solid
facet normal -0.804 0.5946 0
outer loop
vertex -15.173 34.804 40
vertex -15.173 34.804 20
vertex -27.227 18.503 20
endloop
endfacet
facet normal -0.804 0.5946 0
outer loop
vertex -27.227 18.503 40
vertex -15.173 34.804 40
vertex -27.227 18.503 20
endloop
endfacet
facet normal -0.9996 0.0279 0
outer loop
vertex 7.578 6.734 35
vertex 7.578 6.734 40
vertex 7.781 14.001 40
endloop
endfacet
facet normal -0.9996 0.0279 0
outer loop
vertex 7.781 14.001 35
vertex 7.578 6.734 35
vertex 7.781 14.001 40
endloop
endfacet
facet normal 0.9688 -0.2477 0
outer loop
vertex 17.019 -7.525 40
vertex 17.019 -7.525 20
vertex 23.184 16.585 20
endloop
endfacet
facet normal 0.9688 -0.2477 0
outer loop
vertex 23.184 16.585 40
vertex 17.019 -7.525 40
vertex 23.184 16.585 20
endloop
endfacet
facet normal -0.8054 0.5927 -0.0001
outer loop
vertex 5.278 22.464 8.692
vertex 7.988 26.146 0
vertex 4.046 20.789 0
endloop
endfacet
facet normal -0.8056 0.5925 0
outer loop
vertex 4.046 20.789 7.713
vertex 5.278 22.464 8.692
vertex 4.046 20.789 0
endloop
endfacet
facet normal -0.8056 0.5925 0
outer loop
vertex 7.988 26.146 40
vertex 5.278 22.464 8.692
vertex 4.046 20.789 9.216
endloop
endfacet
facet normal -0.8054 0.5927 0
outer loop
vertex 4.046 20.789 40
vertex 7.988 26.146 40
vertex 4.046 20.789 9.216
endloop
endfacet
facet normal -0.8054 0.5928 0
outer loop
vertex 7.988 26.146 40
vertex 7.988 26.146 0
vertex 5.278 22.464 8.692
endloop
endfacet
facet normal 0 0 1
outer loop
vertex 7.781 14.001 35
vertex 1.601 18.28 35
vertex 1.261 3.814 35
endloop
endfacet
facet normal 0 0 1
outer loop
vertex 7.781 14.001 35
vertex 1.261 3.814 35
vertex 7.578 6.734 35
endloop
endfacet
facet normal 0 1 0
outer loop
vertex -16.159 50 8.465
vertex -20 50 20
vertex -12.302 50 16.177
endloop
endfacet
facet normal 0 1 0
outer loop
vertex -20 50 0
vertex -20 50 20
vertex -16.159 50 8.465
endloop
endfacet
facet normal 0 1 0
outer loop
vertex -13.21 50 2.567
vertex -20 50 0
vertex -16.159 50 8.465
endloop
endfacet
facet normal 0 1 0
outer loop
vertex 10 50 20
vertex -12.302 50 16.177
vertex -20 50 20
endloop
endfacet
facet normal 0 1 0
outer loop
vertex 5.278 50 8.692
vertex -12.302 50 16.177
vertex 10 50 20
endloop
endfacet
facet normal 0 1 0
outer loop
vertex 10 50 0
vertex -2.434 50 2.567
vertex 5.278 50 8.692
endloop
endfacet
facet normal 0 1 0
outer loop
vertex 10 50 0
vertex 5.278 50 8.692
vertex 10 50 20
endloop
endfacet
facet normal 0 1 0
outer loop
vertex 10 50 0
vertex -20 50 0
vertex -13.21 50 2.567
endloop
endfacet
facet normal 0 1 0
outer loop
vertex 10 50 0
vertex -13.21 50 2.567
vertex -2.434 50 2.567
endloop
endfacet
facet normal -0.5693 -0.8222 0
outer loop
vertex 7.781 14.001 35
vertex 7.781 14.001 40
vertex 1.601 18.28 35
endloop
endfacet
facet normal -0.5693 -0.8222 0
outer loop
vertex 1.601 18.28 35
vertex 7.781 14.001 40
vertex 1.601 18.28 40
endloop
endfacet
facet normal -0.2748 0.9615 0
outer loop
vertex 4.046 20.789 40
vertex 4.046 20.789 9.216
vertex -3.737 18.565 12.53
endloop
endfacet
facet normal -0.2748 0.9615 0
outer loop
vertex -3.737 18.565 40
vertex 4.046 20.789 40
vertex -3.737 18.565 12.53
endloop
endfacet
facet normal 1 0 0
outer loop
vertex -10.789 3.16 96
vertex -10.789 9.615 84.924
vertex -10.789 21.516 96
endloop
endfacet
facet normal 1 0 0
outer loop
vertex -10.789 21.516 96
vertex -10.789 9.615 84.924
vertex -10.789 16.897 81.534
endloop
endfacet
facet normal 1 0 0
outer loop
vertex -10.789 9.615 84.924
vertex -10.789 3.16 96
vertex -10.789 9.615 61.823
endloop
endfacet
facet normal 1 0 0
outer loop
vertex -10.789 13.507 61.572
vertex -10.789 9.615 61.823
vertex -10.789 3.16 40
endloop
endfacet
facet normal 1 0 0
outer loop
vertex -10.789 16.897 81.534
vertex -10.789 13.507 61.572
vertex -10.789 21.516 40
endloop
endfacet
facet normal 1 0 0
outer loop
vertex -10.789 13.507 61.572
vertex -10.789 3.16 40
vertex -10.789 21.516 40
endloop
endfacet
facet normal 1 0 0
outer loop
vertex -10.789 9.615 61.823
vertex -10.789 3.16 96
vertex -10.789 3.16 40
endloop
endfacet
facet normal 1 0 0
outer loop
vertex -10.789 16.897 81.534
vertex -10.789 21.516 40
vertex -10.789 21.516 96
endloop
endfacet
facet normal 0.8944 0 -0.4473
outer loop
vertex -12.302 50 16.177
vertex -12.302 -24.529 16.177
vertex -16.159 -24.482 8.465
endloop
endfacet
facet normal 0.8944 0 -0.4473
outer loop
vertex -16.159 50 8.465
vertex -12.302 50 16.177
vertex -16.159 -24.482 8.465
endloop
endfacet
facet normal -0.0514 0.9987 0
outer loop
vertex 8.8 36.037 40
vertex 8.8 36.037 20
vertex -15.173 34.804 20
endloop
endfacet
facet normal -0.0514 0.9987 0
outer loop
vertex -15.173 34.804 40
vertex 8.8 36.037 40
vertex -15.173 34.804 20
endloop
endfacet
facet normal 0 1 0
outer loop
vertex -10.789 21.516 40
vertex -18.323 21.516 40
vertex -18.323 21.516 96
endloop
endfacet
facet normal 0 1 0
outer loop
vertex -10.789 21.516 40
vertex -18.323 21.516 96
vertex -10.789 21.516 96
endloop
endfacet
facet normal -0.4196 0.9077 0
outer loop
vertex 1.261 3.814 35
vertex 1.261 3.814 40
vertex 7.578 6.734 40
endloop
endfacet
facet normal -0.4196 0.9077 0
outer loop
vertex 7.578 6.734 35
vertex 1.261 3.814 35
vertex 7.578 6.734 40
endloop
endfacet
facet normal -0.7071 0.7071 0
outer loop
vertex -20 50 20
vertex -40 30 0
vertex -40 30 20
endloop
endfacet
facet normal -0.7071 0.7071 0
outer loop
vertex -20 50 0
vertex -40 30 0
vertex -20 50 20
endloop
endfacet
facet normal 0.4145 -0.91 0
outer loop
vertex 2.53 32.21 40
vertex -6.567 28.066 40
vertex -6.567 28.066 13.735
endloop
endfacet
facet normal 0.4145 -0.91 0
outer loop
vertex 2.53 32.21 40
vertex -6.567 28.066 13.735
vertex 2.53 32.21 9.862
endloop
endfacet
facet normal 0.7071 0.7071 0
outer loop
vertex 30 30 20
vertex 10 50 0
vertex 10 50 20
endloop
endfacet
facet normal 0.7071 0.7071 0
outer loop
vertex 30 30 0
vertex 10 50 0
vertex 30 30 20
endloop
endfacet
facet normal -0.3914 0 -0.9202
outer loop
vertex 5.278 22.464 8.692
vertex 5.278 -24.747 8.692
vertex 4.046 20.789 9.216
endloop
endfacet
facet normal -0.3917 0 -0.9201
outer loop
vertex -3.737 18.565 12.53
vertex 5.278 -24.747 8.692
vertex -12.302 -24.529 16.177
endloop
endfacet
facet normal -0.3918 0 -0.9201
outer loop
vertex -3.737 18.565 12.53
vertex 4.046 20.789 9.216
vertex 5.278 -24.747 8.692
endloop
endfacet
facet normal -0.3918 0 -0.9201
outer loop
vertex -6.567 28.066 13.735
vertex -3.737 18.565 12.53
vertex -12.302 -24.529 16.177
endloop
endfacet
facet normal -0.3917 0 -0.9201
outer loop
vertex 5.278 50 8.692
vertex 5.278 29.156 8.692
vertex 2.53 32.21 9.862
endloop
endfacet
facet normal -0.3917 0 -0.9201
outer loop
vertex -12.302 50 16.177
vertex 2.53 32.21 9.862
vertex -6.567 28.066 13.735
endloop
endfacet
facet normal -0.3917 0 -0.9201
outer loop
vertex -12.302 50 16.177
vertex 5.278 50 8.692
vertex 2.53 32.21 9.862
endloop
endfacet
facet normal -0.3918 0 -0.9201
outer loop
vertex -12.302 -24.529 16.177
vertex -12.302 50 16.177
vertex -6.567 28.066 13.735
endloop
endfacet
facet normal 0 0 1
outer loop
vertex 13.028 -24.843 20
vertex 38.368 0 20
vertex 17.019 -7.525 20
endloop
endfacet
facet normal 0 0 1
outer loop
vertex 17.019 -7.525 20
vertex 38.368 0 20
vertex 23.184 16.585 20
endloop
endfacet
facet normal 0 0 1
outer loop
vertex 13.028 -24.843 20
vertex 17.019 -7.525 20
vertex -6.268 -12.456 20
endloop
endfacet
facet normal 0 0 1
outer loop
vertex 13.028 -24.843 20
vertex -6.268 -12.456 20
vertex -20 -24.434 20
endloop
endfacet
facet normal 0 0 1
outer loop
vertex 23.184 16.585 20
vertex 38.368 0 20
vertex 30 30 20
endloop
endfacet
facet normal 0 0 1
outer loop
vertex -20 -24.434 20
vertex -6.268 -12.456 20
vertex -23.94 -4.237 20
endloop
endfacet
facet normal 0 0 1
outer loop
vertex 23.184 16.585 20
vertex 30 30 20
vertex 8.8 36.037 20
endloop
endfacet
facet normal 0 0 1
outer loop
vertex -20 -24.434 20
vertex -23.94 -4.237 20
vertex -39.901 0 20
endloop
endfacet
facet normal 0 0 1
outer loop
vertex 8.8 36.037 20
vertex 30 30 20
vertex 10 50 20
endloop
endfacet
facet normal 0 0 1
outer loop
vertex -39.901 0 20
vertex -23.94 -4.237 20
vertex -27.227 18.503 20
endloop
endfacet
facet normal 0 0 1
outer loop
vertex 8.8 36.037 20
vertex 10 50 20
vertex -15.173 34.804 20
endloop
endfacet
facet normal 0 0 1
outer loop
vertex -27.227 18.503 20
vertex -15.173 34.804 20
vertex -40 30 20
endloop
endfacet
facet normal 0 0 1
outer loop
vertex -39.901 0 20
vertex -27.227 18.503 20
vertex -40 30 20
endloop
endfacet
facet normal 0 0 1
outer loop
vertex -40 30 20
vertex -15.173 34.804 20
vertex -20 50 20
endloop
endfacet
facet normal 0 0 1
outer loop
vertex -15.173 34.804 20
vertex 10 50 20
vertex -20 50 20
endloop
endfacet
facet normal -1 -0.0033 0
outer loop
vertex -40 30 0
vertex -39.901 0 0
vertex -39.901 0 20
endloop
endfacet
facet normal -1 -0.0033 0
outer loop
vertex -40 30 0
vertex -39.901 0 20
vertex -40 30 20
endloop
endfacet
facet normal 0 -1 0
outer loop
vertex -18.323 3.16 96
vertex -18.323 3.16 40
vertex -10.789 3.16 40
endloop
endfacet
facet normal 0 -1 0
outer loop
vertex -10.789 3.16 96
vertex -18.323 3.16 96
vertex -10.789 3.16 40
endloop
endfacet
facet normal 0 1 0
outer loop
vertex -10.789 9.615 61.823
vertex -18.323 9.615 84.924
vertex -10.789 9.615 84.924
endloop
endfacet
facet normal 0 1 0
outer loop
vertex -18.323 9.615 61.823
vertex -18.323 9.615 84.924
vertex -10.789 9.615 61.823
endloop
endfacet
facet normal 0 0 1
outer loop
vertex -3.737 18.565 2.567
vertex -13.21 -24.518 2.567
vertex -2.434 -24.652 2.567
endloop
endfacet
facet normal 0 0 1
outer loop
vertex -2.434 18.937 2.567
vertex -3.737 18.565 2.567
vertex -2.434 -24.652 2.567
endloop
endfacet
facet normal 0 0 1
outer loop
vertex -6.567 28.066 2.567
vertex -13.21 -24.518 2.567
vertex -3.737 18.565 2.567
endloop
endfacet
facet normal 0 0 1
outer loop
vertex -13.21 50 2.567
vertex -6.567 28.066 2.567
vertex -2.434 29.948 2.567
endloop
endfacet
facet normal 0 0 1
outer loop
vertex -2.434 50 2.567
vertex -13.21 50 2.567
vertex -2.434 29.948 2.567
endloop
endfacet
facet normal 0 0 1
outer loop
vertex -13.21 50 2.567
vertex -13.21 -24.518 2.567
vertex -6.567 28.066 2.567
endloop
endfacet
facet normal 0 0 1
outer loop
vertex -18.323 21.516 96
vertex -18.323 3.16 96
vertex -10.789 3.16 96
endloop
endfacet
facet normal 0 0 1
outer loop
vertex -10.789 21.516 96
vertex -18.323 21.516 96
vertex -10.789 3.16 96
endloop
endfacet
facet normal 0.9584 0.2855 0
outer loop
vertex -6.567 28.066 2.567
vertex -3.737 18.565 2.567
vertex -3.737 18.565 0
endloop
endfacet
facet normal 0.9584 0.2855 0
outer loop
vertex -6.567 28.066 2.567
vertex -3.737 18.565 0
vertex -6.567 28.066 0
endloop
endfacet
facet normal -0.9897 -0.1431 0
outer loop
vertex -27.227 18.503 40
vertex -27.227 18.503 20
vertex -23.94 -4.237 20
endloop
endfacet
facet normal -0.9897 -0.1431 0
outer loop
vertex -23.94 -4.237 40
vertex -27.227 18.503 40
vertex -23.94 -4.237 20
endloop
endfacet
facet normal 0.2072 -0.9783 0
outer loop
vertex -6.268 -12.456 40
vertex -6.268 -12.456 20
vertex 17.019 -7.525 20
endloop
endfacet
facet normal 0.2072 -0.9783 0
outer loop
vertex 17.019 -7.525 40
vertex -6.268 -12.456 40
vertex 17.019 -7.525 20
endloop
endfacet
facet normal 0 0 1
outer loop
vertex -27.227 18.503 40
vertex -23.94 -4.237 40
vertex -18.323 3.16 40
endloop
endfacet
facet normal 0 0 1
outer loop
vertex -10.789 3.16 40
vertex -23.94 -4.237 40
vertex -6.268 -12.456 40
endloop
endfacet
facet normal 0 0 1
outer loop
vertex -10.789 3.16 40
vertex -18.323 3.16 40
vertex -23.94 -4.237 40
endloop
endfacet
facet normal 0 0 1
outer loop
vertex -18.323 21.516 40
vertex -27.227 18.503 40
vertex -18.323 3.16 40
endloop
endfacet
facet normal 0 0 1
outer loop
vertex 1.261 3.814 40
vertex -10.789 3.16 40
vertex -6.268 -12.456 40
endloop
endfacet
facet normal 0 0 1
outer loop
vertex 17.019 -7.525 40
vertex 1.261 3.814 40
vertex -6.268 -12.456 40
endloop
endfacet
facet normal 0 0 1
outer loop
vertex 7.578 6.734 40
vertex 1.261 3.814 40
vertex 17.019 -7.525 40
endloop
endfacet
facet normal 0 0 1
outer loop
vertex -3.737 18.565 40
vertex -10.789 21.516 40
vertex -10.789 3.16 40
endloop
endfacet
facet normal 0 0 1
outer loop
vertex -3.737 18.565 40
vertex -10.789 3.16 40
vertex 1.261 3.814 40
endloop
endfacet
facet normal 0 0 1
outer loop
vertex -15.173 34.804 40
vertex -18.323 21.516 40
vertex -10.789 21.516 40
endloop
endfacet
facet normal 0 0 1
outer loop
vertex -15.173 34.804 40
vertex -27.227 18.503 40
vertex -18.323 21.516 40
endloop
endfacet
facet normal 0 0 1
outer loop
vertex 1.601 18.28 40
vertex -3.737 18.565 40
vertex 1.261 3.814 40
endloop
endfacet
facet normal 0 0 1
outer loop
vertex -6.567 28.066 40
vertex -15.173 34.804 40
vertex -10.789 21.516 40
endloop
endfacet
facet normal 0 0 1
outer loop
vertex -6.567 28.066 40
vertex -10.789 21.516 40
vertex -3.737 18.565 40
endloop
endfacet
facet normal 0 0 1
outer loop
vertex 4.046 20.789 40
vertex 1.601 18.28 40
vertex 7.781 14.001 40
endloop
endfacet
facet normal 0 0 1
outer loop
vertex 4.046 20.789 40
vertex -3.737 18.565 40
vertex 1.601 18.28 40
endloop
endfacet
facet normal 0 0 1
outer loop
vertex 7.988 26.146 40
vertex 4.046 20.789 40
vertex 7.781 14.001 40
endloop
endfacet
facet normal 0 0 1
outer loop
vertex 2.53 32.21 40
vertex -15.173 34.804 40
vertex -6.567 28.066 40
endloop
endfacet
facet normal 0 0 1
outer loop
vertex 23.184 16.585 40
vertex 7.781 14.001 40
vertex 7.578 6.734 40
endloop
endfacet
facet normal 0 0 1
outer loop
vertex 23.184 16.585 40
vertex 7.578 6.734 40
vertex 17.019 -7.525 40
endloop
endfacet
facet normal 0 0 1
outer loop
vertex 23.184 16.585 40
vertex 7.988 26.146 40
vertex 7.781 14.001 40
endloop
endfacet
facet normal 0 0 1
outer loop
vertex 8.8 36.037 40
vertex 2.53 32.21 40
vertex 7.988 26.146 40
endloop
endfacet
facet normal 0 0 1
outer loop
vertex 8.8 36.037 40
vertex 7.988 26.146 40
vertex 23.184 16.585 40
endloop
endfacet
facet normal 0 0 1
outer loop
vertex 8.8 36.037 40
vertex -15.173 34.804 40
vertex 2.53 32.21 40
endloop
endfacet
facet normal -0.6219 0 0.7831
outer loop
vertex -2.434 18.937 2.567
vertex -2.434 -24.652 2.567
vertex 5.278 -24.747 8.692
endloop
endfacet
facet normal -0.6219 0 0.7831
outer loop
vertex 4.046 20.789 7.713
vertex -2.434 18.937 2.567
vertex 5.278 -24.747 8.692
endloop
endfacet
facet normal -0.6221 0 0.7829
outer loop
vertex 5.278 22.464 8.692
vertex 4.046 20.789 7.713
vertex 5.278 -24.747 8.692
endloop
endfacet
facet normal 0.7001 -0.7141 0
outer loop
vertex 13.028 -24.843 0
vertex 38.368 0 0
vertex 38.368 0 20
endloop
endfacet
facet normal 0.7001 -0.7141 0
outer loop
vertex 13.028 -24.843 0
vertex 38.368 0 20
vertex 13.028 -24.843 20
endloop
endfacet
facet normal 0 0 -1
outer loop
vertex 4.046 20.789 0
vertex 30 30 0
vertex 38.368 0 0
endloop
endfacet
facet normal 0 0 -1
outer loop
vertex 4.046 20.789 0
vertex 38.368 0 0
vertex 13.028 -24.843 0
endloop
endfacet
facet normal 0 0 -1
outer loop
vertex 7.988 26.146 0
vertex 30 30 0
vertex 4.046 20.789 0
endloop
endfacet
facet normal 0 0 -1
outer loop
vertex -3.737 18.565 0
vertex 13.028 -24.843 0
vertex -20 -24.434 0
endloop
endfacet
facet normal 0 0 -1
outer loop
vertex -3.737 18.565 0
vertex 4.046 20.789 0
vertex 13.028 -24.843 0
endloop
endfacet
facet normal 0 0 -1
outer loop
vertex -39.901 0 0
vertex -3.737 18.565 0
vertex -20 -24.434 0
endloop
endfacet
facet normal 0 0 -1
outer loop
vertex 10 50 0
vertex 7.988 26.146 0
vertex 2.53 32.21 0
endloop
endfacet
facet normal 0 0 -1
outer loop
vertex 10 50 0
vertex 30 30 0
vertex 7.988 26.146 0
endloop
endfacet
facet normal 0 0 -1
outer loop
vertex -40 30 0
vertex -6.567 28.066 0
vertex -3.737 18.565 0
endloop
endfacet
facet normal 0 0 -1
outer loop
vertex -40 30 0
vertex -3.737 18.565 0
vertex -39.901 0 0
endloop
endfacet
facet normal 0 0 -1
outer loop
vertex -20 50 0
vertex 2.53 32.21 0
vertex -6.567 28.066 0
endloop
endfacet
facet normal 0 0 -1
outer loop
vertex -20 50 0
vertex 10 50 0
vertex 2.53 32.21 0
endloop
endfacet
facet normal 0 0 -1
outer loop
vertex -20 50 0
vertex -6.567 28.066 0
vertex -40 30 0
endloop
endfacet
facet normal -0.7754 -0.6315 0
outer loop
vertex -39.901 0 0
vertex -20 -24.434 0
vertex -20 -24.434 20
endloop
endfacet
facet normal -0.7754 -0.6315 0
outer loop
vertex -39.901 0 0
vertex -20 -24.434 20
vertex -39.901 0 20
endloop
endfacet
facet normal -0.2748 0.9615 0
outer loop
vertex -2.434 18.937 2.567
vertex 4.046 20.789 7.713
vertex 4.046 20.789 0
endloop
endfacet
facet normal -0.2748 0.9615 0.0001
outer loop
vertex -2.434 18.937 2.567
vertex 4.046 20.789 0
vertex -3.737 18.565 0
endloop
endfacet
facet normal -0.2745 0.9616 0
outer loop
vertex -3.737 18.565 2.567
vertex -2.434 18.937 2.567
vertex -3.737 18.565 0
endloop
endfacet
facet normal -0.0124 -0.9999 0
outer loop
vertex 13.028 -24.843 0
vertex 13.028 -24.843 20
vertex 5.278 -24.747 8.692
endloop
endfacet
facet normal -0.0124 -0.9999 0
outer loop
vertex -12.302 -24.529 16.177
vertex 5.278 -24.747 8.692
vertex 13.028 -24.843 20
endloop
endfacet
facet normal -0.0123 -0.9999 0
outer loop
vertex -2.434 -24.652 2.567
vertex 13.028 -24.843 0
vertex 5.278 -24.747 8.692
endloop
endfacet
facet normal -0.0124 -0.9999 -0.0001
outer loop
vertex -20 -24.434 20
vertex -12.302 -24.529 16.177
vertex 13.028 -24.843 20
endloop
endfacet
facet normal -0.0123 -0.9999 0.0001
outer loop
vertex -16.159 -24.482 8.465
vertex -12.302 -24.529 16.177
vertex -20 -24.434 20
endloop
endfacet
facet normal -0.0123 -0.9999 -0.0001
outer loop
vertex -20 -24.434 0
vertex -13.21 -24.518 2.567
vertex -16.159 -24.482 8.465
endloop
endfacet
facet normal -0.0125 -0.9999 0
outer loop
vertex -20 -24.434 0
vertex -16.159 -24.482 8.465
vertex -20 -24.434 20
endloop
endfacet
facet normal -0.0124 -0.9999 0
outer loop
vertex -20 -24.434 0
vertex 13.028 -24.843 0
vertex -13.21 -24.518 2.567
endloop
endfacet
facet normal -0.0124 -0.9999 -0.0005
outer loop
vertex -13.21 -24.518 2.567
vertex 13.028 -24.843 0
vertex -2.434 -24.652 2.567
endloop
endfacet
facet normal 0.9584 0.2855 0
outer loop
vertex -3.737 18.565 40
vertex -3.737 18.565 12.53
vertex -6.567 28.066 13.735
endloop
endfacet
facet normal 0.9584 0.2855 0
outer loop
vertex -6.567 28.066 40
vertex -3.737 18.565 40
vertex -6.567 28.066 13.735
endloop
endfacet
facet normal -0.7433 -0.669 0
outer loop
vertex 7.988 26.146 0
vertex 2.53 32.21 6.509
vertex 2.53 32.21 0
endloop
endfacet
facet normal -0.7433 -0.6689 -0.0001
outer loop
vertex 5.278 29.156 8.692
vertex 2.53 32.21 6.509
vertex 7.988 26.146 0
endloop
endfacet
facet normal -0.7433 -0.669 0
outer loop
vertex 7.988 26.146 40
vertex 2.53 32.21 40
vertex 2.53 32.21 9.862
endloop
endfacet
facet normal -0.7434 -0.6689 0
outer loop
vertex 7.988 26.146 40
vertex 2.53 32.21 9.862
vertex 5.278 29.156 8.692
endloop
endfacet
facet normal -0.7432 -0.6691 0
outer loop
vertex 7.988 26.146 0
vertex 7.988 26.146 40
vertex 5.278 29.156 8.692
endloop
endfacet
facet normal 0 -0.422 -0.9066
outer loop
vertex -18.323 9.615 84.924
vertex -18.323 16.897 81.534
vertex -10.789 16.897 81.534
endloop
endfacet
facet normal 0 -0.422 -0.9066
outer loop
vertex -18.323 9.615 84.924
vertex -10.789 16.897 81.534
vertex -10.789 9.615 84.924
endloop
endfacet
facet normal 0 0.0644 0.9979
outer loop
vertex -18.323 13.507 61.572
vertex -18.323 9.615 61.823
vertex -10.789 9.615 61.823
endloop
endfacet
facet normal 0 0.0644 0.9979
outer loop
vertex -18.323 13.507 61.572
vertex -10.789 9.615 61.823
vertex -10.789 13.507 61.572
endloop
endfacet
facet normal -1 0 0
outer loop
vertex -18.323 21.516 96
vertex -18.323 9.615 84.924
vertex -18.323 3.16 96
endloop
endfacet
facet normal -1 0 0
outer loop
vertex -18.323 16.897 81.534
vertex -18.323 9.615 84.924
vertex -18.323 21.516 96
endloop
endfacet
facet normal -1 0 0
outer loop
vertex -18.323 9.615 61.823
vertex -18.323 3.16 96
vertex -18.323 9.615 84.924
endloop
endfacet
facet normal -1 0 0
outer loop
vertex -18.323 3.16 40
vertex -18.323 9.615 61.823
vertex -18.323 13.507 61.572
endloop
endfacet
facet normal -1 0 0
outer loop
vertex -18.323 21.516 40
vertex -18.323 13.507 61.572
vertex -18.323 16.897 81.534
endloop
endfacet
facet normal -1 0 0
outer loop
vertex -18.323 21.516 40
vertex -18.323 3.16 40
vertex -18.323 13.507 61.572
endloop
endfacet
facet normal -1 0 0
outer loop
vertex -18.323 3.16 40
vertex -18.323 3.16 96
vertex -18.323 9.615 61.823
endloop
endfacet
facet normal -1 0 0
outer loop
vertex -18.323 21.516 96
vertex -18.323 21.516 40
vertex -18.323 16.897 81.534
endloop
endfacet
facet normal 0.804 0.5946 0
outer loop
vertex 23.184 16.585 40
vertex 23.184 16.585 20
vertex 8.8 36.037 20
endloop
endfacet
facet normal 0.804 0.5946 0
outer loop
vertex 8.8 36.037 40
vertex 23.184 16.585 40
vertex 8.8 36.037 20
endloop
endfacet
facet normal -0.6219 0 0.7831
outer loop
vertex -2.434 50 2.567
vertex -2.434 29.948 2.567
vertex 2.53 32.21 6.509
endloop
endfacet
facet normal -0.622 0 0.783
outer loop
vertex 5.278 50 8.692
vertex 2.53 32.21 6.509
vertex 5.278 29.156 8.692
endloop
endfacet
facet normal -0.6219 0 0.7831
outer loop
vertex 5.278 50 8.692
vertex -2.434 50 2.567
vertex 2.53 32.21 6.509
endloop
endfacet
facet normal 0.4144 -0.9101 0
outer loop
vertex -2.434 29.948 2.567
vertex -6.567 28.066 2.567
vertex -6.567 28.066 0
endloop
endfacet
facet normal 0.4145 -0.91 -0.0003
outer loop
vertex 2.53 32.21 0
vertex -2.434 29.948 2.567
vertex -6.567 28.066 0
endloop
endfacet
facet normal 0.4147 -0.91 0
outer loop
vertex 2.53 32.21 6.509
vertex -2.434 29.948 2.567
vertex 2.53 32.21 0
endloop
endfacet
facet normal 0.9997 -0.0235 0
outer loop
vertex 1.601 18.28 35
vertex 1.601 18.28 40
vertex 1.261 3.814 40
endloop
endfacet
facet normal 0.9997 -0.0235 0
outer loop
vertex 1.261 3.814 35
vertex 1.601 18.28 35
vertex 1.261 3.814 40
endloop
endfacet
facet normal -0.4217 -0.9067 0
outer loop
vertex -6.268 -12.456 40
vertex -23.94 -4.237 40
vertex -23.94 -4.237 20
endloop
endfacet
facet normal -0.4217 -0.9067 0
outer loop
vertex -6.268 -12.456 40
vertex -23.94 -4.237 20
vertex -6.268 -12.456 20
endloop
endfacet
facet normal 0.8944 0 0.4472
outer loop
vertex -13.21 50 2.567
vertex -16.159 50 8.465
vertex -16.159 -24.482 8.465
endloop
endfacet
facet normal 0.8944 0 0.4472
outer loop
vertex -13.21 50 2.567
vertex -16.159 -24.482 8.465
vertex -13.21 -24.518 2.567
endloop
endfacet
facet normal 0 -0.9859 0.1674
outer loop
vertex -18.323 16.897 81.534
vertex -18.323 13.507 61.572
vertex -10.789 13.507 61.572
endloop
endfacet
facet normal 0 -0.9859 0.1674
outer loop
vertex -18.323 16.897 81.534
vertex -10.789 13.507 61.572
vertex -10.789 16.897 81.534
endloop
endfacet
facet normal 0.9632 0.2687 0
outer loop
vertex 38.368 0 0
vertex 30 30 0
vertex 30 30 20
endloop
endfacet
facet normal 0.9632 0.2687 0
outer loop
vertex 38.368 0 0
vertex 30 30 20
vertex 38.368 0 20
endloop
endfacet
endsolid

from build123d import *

# Parameters (mm, degrees)
PAD_DEPTH       = 20
PAD001_DEPTH    = 20
SKETCH002_W     = 7.534247
SKETCH002_H     = 18.356169
PAD002_DEPTH    = 56
POCKET_DEPTH    = 5
POCKET001_DEPTH = 40.001
POCKET002_DEPTH = 56.692633
POCKET003_DEPTH = 74.843939


with BuildPart() as part:
    # Sketch → Pad (new body)
    with BuildSketch(Plane.XY):
        Polygon((-40, 30), (-20, 50), (10, 50), (30, 30), (38.36837, 0), (13.027784, -24.842939), (-20, -24.434219), (-39.901337, 0), align=None)
    extrude(amount=PAD_DEPTH)

    # Sketch001 (on Face10 of Pad) → Pad001 (join)
    with BuildSketch(Plane.XY.offset(20)):
        Polygon((-15.172565, 34.803986), (-27.22736, 18.502615), (-23.939688, -4.237112), (-6.268454, -12.456291), (17.019218, -7.524785), (23.183601, 16.584805), (8.800038, 36.036858), align=None)
    extrude(amount=PAD001_DEPTH)

    # Sketch002 (on Face18 of Pad001) → Pad002 (join)
    with BuildSketch(Plane.XY.offset(40)):
        with Locations((-14.5561395, 12.3382465)):
            Rectangle(SKETCH002_W, SKETCH002_H)
    extrude(amount=PAD002_DEPTH)

    # Sketch003 (on Face18 of Pad002) → Pocket (cut)
    with BuildSketch(Plane.XY.offset(40)):
        Polygon((1.600922, 18.280258), (1.261332, 3.813683), (7.577722, 6.734164), (7.781478, 14.001411), align=None)
    extrude(amount=-POCKET_DEPTH, mode=Mode.SUBTRACT)

    # Sketch004 (on Face18 of Pocket) → Pocket001 (cut, through all)
    with BuildSketch(Plane.XY.offset(40)):
        Polygon((-6.566783, 28.06591), (2.529732, 32.209877), (7.987638, 26.145536), (4.045817, 20.788698), (-3.736759, 18.565105), align=None)
    extrude(amount=-POCKET001_DEPTH, mode=Mode.SUBTRACT)

    # Sketch005 (on Face24 of Pocket001) → Pocket002 (cut, through all)
    with BuildSketch(Plane(origin=(-18.323263, 0, 0), x_dir=(0, -1, 0), z_dir=(-1, 0, 0))):
        Polygon((-16.897299, 81.534035), (-9.615451, 84.923866), (-9.615451, 61.822807), (-13.507476, 61.571709), align=None)
    extrude(amount=-POCKET002_DEPTH, mode=Mode.SUBTRACT)

    # Sketch006 (on Face3 of Pocket002) → Pocket003 (cut, through all)
    with BuildSketch(Plane(origin=(0, 50, 0), x_dir=(-1, 0, 0), z_dir=(0, 1, 0))):
        Polygon((-5.278273, 8.691591), (12.302259, 16.17749), (16.158628, 8.464747), (13.209641, 2.566766), (2.434486, 2.566766), align=None)
    extrude(amount=-POCKET003_DEPTH, mode=Mode.SUBTRACT)


solid = part.part
